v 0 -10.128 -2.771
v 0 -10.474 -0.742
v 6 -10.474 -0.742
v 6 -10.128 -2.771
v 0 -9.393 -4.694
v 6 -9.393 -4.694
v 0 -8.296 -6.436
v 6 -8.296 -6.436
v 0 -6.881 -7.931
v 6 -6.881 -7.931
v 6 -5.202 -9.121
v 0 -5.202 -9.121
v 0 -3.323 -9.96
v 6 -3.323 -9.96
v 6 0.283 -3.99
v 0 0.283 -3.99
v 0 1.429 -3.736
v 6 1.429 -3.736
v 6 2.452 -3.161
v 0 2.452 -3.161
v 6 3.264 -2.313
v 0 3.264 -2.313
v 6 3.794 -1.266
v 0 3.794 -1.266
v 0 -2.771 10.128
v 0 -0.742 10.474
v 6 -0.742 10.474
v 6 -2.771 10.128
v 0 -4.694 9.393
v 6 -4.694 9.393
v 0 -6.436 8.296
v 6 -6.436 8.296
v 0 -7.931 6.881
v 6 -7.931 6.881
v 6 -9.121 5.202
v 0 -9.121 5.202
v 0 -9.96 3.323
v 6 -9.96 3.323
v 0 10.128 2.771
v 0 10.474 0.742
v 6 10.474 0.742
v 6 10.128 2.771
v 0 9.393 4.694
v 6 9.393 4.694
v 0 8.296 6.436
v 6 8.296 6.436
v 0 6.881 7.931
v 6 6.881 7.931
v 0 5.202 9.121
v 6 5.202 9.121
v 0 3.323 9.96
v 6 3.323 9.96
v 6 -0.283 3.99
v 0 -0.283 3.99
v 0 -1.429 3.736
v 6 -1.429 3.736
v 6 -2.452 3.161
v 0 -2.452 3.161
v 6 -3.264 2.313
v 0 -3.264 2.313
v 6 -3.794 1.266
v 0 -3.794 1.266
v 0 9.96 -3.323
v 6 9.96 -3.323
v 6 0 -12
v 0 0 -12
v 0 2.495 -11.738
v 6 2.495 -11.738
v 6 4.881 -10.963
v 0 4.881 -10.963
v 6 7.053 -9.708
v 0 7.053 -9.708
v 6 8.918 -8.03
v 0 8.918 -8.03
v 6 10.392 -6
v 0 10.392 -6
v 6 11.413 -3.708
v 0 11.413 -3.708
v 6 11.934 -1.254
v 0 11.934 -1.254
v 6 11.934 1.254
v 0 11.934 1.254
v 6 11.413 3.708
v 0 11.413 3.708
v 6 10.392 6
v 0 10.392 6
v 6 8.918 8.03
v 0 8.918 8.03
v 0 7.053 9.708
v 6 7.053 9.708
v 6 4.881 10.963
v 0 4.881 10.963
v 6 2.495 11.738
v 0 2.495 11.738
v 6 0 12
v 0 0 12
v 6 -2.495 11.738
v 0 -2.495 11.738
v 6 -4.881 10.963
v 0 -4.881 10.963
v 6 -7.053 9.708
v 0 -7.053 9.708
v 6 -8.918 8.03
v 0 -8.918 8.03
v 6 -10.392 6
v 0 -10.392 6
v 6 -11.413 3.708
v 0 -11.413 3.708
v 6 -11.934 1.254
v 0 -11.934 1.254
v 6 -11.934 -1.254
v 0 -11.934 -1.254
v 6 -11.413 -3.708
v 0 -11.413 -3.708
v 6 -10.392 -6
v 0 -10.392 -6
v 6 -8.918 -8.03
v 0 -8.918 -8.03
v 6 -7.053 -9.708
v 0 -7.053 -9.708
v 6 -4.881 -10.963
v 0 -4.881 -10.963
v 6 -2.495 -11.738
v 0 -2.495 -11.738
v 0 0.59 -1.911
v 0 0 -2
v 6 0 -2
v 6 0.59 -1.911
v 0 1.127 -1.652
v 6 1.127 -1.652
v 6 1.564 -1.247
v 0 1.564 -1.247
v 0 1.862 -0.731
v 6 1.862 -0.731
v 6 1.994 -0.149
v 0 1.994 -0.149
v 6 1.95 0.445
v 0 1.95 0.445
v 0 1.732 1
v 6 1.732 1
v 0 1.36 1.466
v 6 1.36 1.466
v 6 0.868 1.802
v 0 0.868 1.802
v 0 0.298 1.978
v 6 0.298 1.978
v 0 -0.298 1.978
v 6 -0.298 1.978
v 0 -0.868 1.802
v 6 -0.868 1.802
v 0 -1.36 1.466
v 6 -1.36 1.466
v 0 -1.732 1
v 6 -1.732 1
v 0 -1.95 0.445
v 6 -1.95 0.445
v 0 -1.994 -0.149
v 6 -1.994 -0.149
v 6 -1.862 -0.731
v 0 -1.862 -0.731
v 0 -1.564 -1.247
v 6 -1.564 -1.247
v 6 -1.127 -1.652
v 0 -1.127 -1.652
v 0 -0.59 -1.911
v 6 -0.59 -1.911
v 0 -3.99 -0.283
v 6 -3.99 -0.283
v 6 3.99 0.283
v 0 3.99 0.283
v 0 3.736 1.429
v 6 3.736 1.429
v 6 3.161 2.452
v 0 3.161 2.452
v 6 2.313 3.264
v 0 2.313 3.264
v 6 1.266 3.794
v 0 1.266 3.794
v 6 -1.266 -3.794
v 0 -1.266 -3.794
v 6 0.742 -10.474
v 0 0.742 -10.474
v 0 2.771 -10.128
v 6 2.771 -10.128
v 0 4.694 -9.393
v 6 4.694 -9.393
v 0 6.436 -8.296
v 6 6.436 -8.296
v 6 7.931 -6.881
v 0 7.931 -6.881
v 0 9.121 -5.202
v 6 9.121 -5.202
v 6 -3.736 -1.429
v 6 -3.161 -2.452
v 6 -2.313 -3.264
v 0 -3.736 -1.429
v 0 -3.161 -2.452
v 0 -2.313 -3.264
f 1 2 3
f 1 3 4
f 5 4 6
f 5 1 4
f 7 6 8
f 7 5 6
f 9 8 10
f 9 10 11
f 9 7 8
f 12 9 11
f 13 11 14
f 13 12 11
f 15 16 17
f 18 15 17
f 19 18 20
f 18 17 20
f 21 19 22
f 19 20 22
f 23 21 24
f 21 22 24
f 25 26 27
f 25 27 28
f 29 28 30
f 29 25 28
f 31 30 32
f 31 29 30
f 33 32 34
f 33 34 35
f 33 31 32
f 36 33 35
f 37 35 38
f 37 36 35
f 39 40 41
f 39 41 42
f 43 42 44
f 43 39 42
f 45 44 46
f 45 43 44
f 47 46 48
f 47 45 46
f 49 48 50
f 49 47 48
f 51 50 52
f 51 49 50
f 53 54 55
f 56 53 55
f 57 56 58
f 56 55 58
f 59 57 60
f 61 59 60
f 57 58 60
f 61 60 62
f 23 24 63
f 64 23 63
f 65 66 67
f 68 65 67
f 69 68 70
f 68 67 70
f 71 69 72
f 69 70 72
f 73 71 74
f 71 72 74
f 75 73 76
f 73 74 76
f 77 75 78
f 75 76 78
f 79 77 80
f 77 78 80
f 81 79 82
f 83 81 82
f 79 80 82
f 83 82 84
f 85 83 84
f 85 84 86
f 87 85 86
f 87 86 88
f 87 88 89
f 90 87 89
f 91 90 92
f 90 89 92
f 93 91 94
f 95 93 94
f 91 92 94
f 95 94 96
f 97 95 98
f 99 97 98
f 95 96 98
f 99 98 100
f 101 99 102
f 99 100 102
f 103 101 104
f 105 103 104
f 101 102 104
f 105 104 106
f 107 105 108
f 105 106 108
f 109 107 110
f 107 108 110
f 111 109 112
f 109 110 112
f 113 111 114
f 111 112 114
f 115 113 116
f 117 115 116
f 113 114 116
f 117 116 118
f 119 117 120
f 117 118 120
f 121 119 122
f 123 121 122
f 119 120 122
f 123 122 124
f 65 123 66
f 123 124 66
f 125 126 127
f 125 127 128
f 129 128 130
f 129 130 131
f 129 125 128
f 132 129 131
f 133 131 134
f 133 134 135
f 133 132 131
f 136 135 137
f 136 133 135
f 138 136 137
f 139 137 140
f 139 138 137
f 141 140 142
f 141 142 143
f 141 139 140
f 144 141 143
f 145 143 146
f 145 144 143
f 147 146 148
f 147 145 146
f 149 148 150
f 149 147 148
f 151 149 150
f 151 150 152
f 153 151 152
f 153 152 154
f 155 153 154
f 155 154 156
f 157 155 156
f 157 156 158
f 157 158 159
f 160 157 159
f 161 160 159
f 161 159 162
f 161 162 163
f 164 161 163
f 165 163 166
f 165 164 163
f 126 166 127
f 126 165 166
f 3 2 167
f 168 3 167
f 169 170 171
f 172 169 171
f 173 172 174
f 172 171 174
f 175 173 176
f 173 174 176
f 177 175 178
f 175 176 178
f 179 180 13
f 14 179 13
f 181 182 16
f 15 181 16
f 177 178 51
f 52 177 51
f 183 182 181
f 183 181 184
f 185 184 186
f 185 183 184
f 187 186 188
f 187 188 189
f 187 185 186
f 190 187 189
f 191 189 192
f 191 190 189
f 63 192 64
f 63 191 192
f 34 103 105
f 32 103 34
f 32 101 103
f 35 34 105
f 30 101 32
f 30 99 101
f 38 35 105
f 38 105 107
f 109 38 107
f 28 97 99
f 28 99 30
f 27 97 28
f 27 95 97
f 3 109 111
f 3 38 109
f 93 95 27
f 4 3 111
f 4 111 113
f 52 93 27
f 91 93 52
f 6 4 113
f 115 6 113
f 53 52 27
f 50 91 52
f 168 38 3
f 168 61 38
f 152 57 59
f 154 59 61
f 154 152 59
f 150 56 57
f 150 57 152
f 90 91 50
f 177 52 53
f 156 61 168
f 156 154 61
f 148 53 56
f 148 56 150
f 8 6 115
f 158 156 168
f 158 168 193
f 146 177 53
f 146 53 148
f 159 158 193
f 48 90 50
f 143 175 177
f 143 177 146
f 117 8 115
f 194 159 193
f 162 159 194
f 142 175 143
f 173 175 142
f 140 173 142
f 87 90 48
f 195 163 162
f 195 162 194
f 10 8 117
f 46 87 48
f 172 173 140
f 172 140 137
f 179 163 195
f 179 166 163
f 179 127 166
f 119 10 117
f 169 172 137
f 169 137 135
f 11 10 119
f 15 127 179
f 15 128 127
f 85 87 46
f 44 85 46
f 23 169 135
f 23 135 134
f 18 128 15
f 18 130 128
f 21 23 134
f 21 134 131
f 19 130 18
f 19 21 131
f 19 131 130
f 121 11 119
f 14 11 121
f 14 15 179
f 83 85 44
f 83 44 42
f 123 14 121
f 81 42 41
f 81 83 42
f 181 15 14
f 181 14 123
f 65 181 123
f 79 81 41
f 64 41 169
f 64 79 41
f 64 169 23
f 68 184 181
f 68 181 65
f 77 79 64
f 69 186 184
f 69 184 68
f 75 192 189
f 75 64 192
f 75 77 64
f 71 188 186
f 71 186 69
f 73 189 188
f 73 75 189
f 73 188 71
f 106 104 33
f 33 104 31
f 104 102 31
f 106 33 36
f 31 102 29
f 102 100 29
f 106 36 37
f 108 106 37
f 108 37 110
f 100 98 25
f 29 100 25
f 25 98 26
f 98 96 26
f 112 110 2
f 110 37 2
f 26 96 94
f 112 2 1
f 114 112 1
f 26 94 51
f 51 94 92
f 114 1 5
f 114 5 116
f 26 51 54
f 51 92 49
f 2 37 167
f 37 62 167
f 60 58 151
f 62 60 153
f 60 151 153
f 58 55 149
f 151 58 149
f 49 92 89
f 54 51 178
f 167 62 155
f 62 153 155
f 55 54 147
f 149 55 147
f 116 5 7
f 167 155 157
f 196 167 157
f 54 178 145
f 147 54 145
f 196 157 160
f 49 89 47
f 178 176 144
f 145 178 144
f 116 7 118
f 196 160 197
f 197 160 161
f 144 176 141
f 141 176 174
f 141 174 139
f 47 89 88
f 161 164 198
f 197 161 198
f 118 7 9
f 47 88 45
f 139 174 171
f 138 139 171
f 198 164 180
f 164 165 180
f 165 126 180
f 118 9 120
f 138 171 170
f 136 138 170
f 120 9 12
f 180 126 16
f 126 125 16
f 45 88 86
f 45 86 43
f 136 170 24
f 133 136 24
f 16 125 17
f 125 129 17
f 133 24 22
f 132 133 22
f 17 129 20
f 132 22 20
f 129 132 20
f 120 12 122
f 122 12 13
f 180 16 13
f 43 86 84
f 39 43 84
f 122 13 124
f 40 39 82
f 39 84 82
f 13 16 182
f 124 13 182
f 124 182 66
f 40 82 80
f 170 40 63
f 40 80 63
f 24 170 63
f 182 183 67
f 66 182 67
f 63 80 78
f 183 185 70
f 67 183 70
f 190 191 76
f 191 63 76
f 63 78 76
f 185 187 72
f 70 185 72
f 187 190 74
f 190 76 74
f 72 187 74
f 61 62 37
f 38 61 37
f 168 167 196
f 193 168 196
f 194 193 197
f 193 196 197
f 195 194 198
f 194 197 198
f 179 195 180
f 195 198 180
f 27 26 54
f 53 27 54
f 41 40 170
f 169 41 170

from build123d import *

# Parameters (mm, degrees)
SKETCH_2_R          = 12
SKETCH_2_R_2        = 10.5
SKETCH_2_R_3        = 4
SKETCH_2_R_4        = 2
BOSS_EXTRUDE1_DEPTH = 6


with BuildPart() as part:
    # 草图2 → Boss-Extrude1 (new body)
    # profile 1 of 6: a face of its own
    with BuildSketch(Plane(origin=(0, 0, 0), x_dir=(0, 0, -1), z_dir=(1, 0, 0))):
        Circle(SKETCH_2_R)
        Circle(SKETCH_2_R_2, mode=Mode.SUBTRACT)
    # profile 2 of 6: a face of its own
    with BuildSketch(Plane(origin=(0, 0, 0), x_dir=(0, 0, -1), z_dir=(1, 0, 0))):
        with BuildLine():
            Line((-0.741872063, 10.473758917), (-0.282617929, 3.990003397))
            ThreePointArc((-0.282617929, 3.990003397), (0.501223543, 3.968472623), (1.265803275, 3.794435672))
            Line((1.265803275, 3.794435672), (3.322733597, 9.960393639))
            ThreePointArc((3.322733597, 9.960393639), (1.315711801, 10.417240635), (-0.741872063, 10.473758917))
        make_face()
    # profile 3 of 6: a face of its own
    with BuildSketch(Plane(origin=(0, 0, 0), x_dir=(0, 0, -1), z_dir=(1, 0, 0))):
        with BuildLine():
            Line((10.473758917, 0.741872063), (3.990003397, 0.282617929))
            ThreePointArc((3.990003397, 0.282617929), (3.997500068, 0.141397335), (4, 0))
            ThreePointArc((4, 0), (3.948274477, -0.64119315), (3.794435672, -1.265803275))
            Line((3.794435672, -1.265803275), (9.960393639, -3.322733597))
            ThreePointArc((9.960393639, -3.322733597), (10.364220502, -1.68313202), (10.5, 0))
            ThreePointArc((10.5, 0), (10.493437678, 0.371168005), (10.473758917, 0.741872063))
        make_face()
    # profile 4 of 6: a face of its own
    with BuildSketch(Plane(origin=(0, 0, 0), x_dir=(0, 0, -1), z_dir=(1, 0, 0))):
        with BuildLine():
            ThreePointArc((0.282617929, -3.990003397), (-0.501223543, -3.968472623), (-1.265803275, -3.794435672))
            Line((-1.265803275, -3.794435672), (-3.322733597, -9.960393639))
            ThreePointArc((-3.322733597, -9.960393639), (-1.315711801, -10.417240635), (0.741872063, -10.473758917))
            Line((0.741872063, -10.473758917), (0.282617929, -3.990003397))
        make_face()
    # profile 5 of 6: a face of its own
    with BuildSketch(Plane(origin=(0, 0, 0), x_dir=(0, 0, -1), z_dir=(1, 0, 0))):
        Circle(SKETCH_2_R_3)
        Circle(SKETCH_2_R_4, mode=Mode.SUBTRACT)
    # profile 6 of 6: a face of its own
    with BuildSketch(Plane(origin=(0, 0, 0), x_dir=(0, 0, -1), z_dir=(1, 0, 0))):
        with BuildLine():
            ThreePointArc((-3.990003397, -0.282617929), (-3.968472623, 0.501223543), (-3.794435672, 1.265803275))
            Line((-3.794435672, 1.265803275), (-9.960393639, 3.322733597))
            ThreePointArc((-9.960393639, 3.322733597), (-10.417240635, 1.315711801), (-10.473758917, -0.741872063))
            Line((-10.473758917, -0.741872063), (-3.990003397, -0.282617929))
        make_face()
    extrude(amount=BOSS_EXTRUDE1_DEPTH)


solid = part.part
